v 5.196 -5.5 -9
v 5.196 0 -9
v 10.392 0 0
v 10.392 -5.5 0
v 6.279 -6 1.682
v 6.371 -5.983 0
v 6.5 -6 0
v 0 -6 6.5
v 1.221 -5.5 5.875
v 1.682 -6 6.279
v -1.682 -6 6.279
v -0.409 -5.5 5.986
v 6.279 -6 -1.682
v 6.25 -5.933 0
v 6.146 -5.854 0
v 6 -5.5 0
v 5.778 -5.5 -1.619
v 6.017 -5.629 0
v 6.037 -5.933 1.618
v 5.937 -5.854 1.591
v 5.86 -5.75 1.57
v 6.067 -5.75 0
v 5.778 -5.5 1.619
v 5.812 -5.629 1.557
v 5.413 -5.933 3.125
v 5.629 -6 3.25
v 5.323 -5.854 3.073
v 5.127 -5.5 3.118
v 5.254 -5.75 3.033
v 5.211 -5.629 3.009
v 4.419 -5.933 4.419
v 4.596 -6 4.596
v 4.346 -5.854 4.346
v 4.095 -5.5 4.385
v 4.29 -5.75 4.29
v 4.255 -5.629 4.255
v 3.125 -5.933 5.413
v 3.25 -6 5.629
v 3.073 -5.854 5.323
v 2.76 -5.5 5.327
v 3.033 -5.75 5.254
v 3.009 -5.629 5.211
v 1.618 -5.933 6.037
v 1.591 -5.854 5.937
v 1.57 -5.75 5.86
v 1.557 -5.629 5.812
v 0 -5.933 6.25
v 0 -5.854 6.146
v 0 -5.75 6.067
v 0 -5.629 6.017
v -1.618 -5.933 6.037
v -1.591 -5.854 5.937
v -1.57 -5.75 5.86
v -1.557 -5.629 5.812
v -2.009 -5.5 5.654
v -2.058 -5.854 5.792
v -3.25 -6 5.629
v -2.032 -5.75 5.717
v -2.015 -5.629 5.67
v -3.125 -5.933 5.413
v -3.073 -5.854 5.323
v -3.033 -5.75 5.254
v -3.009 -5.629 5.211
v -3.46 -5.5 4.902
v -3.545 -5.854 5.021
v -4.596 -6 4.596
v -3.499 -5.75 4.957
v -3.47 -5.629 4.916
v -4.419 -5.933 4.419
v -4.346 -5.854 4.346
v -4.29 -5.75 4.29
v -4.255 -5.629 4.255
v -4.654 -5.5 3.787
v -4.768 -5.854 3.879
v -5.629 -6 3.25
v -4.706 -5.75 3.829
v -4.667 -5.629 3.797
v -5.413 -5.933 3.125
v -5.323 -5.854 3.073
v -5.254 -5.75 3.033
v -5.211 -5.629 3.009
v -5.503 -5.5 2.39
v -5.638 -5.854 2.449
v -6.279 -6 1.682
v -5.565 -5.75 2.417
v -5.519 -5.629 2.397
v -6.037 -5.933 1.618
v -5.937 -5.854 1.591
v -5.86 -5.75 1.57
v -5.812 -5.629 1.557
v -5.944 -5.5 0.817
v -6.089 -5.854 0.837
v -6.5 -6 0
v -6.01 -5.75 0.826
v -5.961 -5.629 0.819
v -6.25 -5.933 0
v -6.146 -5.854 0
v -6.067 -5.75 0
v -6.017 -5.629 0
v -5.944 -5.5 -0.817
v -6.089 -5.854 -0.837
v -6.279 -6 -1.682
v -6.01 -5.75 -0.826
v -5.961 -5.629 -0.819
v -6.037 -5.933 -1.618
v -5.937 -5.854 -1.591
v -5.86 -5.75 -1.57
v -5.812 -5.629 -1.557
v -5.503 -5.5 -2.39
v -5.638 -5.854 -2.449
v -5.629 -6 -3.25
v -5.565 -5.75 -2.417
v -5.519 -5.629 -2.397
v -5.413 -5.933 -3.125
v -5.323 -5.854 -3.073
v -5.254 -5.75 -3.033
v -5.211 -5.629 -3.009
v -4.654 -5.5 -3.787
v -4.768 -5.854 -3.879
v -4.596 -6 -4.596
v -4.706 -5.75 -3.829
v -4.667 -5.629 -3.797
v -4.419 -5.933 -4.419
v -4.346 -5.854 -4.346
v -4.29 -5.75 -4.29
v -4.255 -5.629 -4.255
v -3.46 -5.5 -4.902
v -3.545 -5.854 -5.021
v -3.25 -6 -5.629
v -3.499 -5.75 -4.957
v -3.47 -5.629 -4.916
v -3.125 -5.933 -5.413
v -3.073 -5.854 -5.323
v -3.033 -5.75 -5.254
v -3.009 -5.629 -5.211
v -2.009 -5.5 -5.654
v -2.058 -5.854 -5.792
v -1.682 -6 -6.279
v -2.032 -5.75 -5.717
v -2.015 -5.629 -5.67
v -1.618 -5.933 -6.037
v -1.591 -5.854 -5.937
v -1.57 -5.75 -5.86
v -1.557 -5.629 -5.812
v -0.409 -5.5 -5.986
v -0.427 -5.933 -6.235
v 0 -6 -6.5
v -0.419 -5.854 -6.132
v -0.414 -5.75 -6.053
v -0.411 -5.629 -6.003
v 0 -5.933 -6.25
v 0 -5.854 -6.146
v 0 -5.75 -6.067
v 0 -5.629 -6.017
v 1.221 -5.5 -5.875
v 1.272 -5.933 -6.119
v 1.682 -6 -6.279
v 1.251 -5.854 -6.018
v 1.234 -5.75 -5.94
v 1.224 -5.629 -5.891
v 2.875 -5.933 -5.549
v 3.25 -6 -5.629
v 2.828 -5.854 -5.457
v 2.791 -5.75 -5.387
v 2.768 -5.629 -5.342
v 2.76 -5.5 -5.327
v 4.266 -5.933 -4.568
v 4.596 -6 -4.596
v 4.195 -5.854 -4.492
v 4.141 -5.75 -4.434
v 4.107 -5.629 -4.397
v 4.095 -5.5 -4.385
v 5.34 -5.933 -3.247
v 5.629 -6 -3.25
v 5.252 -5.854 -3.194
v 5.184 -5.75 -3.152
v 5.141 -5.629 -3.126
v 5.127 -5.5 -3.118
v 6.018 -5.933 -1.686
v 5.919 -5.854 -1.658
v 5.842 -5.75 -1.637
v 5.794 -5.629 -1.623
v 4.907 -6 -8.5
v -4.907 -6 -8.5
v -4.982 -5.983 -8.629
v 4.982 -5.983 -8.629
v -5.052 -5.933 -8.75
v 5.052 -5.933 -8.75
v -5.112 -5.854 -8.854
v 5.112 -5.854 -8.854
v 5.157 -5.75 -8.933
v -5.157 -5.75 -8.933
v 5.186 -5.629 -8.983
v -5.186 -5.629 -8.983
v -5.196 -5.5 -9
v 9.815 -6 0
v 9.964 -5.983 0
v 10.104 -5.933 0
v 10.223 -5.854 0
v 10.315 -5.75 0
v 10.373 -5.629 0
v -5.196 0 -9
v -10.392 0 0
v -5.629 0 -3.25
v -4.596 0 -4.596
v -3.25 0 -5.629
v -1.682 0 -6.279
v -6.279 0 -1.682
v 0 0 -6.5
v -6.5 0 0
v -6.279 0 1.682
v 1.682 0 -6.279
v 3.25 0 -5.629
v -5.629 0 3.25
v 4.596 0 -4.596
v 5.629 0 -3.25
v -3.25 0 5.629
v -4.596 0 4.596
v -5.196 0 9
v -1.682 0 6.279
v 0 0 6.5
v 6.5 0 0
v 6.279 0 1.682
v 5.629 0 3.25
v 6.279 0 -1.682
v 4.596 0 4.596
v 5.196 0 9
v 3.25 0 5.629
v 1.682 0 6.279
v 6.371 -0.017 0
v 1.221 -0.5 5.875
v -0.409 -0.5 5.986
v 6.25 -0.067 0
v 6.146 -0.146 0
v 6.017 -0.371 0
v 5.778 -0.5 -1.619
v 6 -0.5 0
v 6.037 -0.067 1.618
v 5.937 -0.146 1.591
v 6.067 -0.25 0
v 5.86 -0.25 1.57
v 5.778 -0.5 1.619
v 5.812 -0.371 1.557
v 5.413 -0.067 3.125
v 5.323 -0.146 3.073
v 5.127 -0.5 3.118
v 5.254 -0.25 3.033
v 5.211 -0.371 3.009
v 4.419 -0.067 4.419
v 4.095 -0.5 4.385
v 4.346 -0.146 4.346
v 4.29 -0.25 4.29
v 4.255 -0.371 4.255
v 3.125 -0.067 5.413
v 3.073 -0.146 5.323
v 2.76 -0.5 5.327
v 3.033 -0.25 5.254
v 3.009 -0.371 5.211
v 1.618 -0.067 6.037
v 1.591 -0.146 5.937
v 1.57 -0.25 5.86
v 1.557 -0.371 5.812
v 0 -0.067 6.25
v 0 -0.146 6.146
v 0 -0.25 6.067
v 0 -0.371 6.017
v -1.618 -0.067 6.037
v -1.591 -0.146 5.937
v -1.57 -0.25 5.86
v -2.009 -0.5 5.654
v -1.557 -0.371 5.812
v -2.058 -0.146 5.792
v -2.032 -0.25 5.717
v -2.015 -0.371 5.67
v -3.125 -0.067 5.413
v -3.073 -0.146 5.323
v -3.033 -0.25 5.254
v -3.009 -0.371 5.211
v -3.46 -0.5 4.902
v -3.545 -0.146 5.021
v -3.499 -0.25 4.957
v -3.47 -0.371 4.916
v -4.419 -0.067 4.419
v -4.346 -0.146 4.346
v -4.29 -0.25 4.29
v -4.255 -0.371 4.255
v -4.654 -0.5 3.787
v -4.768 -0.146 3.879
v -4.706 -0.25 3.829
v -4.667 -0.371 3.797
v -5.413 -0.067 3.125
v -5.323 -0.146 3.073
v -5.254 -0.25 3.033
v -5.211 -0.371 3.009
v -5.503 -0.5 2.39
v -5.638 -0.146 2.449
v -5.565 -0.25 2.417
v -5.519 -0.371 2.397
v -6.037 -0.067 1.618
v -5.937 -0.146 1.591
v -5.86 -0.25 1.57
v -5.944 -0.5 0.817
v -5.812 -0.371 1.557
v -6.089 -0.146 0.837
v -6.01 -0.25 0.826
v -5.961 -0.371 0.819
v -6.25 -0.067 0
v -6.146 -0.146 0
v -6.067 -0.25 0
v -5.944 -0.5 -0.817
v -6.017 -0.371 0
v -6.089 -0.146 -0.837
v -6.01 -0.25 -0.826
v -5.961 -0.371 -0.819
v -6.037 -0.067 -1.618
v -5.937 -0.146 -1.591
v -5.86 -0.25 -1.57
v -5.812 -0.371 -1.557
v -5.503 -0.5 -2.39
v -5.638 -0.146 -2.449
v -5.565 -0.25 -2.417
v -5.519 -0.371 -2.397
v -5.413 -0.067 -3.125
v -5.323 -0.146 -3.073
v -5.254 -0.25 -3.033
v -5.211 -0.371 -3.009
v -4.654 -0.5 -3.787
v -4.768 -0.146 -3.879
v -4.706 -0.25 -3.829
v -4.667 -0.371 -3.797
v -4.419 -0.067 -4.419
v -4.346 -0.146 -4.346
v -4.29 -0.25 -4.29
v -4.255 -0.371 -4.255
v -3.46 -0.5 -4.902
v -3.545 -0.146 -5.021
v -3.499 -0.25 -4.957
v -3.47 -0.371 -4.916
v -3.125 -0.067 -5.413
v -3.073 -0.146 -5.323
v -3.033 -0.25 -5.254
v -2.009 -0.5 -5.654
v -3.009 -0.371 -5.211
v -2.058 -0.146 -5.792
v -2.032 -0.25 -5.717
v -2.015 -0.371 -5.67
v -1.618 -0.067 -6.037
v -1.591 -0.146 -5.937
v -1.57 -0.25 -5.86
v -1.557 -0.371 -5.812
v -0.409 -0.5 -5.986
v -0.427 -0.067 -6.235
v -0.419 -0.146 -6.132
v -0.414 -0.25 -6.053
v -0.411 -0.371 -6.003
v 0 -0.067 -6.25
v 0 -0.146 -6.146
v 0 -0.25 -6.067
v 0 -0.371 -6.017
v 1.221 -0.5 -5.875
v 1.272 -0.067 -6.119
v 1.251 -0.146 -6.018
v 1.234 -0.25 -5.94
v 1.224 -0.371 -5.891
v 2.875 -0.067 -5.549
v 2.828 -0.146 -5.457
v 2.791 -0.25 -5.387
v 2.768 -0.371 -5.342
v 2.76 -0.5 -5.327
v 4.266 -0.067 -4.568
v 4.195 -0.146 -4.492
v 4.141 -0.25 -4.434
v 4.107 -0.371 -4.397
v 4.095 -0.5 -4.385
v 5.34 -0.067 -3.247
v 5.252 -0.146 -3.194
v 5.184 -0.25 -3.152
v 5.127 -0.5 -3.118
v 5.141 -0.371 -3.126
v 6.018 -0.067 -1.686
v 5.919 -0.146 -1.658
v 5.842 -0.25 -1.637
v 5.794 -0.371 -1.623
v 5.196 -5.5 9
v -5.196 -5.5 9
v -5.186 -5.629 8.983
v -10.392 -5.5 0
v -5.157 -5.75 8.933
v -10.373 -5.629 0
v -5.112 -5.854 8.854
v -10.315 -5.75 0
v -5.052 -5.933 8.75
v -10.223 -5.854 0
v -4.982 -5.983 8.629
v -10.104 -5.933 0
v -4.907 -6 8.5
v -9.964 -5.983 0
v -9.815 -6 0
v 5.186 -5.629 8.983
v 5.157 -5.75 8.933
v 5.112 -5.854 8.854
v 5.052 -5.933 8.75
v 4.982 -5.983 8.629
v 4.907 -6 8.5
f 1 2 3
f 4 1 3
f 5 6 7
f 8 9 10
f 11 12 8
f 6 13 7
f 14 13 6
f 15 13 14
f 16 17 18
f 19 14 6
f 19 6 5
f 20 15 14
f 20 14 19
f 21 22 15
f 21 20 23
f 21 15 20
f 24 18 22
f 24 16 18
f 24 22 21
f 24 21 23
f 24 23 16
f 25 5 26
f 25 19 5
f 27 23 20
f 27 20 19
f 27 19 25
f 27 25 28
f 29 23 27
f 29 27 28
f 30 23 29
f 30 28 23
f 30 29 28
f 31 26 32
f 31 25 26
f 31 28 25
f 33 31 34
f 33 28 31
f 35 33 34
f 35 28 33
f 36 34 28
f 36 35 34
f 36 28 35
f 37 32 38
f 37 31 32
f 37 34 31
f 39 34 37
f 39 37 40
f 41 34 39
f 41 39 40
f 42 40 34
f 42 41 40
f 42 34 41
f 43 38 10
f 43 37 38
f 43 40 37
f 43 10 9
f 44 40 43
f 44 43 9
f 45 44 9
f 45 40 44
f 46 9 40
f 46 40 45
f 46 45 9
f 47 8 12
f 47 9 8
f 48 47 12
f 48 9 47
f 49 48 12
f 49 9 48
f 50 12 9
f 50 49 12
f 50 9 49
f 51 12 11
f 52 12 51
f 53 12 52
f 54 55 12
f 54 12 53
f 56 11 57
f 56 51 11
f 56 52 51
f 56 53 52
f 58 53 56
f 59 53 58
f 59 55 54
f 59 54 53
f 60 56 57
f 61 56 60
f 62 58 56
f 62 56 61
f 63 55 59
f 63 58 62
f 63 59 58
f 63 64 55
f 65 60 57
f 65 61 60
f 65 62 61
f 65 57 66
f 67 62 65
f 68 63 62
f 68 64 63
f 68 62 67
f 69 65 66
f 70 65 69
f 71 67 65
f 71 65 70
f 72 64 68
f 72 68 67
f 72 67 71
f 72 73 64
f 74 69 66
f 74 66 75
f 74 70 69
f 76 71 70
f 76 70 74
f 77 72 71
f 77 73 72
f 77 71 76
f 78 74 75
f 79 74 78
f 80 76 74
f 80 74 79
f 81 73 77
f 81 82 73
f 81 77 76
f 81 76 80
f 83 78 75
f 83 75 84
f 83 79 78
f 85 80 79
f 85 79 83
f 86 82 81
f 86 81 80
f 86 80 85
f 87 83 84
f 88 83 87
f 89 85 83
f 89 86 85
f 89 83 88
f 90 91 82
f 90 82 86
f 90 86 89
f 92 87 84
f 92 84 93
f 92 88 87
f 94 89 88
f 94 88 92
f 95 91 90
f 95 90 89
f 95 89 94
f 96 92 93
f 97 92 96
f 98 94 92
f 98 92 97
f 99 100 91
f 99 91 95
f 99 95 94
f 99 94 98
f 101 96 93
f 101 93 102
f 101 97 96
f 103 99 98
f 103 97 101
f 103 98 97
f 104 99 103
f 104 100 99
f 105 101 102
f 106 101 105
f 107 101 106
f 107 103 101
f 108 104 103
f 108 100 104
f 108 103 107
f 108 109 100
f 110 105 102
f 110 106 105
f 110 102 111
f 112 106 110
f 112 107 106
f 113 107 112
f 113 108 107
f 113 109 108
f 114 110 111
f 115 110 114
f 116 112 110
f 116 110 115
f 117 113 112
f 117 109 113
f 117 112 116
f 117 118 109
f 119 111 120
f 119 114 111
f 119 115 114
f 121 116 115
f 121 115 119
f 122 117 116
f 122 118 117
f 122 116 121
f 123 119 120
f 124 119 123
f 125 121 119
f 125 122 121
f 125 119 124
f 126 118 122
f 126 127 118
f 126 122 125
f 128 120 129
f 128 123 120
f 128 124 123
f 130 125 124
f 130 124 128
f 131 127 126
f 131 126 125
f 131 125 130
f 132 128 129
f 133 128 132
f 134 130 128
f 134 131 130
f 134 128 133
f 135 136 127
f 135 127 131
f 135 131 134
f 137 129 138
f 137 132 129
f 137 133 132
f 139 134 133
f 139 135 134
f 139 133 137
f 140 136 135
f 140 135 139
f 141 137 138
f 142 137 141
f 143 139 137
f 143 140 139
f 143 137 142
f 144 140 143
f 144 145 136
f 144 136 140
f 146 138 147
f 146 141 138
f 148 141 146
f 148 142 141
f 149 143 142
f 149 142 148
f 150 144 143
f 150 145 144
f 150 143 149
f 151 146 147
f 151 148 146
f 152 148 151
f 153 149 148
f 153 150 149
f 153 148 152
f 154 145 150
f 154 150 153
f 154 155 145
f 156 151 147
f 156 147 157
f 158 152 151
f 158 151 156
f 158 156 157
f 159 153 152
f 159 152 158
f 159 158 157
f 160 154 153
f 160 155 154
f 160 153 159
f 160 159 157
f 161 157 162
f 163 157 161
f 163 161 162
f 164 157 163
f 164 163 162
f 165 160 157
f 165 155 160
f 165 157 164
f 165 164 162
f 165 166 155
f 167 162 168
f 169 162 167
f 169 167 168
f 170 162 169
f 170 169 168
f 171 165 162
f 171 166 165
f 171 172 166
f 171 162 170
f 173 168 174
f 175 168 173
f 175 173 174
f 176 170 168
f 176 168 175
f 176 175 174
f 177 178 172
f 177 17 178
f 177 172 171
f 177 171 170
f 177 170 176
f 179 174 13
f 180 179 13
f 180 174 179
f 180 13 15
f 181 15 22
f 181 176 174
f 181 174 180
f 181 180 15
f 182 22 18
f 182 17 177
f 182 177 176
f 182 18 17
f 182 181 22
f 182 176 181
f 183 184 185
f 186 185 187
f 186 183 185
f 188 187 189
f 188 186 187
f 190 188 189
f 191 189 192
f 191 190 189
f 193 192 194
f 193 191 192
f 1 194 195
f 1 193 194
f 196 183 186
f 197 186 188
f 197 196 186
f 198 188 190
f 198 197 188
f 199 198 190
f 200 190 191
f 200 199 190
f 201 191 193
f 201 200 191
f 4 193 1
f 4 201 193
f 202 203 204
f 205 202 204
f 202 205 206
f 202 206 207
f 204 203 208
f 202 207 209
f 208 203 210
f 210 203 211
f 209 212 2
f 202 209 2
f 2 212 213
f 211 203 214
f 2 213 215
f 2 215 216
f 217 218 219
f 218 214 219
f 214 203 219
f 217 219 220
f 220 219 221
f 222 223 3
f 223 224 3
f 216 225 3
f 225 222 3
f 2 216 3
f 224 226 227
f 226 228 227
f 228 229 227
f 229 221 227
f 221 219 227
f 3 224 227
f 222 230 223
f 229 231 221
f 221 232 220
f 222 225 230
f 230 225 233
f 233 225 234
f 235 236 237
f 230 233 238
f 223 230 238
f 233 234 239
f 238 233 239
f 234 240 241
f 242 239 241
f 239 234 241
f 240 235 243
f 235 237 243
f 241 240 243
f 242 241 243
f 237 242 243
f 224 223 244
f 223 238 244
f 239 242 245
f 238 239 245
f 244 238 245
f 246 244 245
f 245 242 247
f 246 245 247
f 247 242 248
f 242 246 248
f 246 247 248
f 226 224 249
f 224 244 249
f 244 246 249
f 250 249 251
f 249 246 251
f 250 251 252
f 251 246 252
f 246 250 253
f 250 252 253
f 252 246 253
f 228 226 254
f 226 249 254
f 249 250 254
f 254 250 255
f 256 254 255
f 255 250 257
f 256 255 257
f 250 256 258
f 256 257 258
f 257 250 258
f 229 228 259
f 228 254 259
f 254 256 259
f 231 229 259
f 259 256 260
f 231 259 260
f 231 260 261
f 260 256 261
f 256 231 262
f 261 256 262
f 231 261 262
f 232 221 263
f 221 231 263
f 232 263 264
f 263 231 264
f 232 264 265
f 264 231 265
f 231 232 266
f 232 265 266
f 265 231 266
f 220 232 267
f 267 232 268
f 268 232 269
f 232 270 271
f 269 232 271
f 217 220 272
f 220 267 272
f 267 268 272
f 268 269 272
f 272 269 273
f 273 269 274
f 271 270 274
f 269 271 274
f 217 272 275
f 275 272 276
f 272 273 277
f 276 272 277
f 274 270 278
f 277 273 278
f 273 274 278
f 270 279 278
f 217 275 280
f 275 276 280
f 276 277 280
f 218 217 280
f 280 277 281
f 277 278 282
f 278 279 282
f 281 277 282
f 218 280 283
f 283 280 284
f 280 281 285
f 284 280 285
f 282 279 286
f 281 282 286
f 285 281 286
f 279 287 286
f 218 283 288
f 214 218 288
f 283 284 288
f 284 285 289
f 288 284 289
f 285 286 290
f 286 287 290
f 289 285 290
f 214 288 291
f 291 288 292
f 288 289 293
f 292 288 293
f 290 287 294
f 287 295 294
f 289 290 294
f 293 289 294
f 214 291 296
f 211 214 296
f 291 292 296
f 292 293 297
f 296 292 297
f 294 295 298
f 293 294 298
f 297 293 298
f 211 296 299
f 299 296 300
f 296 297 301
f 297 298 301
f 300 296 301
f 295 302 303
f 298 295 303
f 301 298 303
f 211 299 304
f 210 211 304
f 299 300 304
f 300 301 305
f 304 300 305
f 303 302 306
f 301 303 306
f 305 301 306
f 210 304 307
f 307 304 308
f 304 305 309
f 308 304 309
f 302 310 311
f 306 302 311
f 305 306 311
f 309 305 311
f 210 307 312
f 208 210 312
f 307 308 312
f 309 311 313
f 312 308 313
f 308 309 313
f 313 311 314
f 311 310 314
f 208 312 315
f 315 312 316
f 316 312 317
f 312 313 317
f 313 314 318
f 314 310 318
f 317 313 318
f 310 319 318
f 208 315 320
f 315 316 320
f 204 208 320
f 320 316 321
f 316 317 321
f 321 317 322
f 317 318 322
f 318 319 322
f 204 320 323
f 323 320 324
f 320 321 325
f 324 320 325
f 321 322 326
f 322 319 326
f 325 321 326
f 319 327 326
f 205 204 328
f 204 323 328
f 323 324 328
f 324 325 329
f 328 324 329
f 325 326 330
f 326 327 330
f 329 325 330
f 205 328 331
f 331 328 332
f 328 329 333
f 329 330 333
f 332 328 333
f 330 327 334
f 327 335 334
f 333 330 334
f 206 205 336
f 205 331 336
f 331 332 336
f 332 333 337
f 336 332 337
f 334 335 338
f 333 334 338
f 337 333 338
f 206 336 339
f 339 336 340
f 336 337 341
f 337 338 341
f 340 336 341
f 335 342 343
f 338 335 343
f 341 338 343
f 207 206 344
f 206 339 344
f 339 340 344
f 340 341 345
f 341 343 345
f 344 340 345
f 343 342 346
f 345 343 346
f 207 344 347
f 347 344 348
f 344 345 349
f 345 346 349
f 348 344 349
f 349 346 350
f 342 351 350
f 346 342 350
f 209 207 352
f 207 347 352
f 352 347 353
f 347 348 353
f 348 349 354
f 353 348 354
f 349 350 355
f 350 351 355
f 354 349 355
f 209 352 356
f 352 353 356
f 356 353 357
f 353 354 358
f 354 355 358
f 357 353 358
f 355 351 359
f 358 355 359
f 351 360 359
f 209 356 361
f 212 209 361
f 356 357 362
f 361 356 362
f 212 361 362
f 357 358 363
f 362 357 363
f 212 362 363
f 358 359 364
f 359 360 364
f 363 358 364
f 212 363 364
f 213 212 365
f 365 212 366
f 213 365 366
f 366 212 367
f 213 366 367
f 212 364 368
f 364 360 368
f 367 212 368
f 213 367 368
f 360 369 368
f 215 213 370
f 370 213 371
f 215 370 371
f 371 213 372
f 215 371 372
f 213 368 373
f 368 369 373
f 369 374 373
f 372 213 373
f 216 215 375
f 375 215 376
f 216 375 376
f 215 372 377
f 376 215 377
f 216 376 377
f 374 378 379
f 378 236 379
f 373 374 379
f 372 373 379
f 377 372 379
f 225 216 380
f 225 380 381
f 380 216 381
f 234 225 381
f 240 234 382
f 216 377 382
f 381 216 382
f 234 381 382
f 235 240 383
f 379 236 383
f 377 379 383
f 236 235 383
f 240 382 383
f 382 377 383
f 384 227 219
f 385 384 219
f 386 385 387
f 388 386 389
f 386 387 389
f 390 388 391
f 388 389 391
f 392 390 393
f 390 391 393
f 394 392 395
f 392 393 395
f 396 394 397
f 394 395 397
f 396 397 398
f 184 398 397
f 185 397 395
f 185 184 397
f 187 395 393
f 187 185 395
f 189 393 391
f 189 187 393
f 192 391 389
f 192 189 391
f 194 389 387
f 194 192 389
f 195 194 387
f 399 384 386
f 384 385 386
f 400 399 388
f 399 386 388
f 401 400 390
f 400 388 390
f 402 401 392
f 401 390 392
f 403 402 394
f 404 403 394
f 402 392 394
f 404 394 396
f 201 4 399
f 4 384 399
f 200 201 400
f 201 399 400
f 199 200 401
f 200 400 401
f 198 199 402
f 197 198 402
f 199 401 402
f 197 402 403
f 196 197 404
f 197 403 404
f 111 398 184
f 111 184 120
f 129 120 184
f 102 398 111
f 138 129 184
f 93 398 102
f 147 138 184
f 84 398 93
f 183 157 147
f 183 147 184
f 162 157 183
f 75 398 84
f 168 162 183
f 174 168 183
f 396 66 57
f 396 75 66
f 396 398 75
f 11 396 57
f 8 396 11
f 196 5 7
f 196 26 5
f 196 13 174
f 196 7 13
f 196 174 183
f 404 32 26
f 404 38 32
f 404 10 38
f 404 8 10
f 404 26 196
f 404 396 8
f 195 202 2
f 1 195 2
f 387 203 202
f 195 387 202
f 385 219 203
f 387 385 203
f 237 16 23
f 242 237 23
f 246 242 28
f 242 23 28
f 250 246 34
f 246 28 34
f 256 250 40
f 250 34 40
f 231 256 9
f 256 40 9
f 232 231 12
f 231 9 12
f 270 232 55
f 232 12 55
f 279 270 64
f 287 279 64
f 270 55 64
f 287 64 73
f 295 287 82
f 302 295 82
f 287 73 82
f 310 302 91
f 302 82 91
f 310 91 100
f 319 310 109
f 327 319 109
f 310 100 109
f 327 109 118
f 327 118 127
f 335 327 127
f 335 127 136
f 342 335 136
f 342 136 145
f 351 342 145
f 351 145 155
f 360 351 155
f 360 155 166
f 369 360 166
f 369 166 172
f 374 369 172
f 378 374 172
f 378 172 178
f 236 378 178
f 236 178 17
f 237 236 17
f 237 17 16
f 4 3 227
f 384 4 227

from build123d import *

# Parameters (mm, degrees)
F1_DEPTH = 6
F2_R     = 6
F3_DEPTH = 25
F4_R     = 0.5


with BuildPart() as f1:
    # F0 (on Front) → F1 (new body)
    with BuildSketch(Plane.XZ):
        Polygon((5.1961524227, 9), (-5.1961524227, 9), (-10.3923048454, 0), (-5.1961524227, -9), (5.1961524227, -9), (10.3923048454, 0), align=None)
    extrude(amount=F1_DEPTH)

    # F2 (on face) → F3 (cut)
    with BuildSketch(Plane.XZ.offset(6)):
        Circle(F2_R)
    extrude(amount=-F3_DEPTH, mode=Mode.SUBTRACT)

    # F4
    f4_edges = [f1.edges().sort_by_distance(p)[0] for p in [
        (7.794229, -6, 4.5),
        (7.794229, -6, -4.5),
        (0, -6, 9),
        (0, -6, -9),
        (-7.794229, -6, 4.5),
        (-7.794229, -6, -4.5),
        (-6, -6, 0),
        (-6, 0, 0),
    ]]
    fillet(f4_edges, radius=F4_R)


solid = f1.part
